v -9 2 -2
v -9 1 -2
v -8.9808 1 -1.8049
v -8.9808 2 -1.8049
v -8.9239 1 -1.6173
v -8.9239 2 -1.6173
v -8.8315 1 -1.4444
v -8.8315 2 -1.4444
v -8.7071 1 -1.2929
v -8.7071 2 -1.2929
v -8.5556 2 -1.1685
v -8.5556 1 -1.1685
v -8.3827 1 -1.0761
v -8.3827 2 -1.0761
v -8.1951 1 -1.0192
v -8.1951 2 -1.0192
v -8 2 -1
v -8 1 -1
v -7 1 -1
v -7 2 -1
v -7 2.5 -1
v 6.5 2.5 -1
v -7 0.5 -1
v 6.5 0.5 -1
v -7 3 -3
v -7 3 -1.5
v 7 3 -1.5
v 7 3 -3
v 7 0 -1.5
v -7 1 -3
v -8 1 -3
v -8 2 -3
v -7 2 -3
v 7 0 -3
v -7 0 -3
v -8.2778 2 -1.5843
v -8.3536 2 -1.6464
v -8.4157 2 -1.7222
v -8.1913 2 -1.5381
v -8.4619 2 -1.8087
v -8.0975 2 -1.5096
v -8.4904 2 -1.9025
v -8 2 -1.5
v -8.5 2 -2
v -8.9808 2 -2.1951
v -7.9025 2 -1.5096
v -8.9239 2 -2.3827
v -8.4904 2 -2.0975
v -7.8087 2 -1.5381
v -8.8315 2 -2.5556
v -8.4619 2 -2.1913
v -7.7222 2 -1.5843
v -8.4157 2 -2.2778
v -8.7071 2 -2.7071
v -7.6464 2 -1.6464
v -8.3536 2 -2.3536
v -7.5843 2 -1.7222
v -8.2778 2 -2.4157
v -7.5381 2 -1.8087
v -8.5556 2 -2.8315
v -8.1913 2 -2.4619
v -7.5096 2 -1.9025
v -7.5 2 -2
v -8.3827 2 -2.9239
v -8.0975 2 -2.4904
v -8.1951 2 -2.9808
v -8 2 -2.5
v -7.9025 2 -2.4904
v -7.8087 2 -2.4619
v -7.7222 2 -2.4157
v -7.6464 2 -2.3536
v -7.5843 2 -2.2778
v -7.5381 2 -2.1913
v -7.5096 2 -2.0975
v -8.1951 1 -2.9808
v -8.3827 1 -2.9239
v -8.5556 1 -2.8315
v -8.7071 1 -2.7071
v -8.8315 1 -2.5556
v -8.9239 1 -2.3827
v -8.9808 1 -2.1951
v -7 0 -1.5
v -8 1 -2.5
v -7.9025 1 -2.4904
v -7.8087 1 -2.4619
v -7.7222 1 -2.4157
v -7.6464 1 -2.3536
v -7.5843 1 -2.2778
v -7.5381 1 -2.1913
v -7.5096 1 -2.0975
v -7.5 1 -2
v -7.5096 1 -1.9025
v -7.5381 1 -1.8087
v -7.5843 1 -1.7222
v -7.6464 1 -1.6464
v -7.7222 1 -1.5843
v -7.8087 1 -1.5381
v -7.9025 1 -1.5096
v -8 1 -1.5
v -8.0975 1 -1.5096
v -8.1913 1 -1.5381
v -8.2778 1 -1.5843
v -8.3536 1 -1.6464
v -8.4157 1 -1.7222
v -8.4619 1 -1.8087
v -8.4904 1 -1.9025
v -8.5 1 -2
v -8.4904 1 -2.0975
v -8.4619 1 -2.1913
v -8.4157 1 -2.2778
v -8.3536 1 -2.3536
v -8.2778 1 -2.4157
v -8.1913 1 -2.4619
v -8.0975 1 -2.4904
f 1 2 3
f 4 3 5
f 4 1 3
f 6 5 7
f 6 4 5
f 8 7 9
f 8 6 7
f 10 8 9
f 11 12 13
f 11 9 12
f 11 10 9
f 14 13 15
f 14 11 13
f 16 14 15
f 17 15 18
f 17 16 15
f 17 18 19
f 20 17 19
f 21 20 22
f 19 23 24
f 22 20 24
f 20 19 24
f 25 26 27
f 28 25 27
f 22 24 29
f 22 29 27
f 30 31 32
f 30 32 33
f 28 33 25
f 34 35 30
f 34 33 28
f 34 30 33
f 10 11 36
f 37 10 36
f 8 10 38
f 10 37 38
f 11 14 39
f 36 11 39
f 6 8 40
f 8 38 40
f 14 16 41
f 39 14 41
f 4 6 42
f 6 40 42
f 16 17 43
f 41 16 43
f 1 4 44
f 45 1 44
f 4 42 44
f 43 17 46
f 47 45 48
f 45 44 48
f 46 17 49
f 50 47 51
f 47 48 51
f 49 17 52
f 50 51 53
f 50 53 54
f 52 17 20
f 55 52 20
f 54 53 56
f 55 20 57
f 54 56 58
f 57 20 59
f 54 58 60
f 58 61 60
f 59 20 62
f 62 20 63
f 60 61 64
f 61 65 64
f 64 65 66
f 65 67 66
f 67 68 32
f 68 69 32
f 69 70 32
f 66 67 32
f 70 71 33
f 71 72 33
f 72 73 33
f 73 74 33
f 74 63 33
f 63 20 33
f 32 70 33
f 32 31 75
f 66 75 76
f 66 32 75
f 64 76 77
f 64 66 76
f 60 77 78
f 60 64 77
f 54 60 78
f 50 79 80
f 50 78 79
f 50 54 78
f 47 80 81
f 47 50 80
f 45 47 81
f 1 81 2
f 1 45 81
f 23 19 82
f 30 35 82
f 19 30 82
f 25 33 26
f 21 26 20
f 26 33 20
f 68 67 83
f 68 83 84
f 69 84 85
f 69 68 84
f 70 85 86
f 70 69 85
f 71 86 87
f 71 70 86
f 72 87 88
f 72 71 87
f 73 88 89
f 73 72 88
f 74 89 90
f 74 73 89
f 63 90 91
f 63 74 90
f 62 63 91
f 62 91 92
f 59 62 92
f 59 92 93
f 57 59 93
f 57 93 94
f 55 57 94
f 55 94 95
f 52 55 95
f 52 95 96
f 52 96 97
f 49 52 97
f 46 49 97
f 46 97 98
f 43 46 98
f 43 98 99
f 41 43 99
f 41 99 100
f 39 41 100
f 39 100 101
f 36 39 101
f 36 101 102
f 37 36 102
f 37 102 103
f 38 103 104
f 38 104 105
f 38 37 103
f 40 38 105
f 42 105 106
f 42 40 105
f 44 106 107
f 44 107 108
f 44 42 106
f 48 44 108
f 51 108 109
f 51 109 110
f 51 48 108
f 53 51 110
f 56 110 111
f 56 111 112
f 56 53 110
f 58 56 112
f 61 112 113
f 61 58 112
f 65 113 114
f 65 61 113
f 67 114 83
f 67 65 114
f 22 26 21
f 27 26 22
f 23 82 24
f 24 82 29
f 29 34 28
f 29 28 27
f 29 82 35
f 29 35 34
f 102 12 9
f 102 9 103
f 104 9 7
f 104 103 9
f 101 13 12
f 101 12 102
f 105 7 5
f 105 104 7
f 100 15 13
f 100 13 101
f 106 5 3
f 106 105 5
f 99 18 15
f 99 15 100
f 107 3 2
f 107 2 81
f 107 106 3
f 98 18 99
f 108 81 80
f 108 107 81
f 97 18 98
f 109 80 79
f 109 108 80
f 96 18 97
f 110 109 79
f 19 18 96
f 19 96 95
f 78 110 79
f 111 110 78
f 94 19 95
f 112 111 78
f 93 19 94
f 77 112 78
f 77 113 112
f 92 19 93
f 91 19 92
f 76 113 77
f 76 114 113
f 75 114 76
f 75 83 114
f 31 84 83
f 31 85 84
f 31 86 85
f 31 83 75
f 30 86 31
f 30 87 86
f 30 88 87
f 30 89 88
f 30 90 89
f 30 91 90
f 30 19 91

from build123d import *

# Parameters (mm, degrees)
SKETCH1_W           = 14
SKETCH1_H           = 2
BOSS_EXTRUDE1_DEPTH = 3
CHAMFER1_SIZE       = 0.5
SKETCH2_W           = 2
SKETCH2_H           = 1
BOSS_EXTRUDE2_DEPTH = 2
SKETCH3_R           = 0.5
CUT_EXTRUDE1_DEPTH  = 2


with BuildPart() as part:
    # Sketch1 → Boss-Extrude1 (new body)
    with BuildSketch(Plane(origin=(0, 0, 0), x_dir=(1, 0, 0), z_dir=(0, 1, 0))):
        Rectangle(SKETCH1_W, SKETCH1_H)
    extrude(amount=BOSS_EXTRUDE1_DEPTH)

    # Chamfer1
    chamfer1_edges = [part.edges().sort_by_distance(p)[0] for p in [
        (0, 0, -1),
        (7, 1.5, -1),
        (0, 3, -1),
    ]]
    chamfer(chamfer1_edges, length=CHAMFER1_SIZE)

    # Sketch2 → Boss-Extrude2 (add)
    with BuildSketch(Plane.ZY.offset(7)):
        with Locations((0, 1.5)):
            Rectangle(SKETCH2_W, SKETCH2_H)
    extrude(amount=BOSS_EXTRUDE2_DEPTH)

    # Sketch3 → Cut-Extrude1 (cut)
    with BuildSketch(Plane(origin=(0, 2, 0), x_dir=(1, 0, 0), z_dir=(0, 1, 0))):
        with Locations(Location((-8, 0, 0), (0, 0, 270))):
            Circle(SKETCH3_R)
        with BuildLine():
            ThreePointArc((-9, 0), (-8.707106781, 0.707106781), (-8, 1))
            Line((-8, 1), (-9, 1))
            Line((-9, 1), (-9, 0))
        make_face()
        with BuildLine():
            Line((-9, -1), (-8, -1))
            ThreePointArc((-8, -1), (-8.707106781, -0.707106781), (-9, 0))
            Line((-9, 0), (-9, -1))
        make_face()
    extrude(amount=-CUT_EXTRUDE1_DEPTH, mode=Mode.SUBTRACT)


with BuildPart() as body_2:
    # Mirror1: mirrored copy
    add(part.part.mirror(Plane(origin=(-7, 3, -1), x_dir=(1, 0, 0), z_dir=(0, 0, 1))))


solid = body_2.part
